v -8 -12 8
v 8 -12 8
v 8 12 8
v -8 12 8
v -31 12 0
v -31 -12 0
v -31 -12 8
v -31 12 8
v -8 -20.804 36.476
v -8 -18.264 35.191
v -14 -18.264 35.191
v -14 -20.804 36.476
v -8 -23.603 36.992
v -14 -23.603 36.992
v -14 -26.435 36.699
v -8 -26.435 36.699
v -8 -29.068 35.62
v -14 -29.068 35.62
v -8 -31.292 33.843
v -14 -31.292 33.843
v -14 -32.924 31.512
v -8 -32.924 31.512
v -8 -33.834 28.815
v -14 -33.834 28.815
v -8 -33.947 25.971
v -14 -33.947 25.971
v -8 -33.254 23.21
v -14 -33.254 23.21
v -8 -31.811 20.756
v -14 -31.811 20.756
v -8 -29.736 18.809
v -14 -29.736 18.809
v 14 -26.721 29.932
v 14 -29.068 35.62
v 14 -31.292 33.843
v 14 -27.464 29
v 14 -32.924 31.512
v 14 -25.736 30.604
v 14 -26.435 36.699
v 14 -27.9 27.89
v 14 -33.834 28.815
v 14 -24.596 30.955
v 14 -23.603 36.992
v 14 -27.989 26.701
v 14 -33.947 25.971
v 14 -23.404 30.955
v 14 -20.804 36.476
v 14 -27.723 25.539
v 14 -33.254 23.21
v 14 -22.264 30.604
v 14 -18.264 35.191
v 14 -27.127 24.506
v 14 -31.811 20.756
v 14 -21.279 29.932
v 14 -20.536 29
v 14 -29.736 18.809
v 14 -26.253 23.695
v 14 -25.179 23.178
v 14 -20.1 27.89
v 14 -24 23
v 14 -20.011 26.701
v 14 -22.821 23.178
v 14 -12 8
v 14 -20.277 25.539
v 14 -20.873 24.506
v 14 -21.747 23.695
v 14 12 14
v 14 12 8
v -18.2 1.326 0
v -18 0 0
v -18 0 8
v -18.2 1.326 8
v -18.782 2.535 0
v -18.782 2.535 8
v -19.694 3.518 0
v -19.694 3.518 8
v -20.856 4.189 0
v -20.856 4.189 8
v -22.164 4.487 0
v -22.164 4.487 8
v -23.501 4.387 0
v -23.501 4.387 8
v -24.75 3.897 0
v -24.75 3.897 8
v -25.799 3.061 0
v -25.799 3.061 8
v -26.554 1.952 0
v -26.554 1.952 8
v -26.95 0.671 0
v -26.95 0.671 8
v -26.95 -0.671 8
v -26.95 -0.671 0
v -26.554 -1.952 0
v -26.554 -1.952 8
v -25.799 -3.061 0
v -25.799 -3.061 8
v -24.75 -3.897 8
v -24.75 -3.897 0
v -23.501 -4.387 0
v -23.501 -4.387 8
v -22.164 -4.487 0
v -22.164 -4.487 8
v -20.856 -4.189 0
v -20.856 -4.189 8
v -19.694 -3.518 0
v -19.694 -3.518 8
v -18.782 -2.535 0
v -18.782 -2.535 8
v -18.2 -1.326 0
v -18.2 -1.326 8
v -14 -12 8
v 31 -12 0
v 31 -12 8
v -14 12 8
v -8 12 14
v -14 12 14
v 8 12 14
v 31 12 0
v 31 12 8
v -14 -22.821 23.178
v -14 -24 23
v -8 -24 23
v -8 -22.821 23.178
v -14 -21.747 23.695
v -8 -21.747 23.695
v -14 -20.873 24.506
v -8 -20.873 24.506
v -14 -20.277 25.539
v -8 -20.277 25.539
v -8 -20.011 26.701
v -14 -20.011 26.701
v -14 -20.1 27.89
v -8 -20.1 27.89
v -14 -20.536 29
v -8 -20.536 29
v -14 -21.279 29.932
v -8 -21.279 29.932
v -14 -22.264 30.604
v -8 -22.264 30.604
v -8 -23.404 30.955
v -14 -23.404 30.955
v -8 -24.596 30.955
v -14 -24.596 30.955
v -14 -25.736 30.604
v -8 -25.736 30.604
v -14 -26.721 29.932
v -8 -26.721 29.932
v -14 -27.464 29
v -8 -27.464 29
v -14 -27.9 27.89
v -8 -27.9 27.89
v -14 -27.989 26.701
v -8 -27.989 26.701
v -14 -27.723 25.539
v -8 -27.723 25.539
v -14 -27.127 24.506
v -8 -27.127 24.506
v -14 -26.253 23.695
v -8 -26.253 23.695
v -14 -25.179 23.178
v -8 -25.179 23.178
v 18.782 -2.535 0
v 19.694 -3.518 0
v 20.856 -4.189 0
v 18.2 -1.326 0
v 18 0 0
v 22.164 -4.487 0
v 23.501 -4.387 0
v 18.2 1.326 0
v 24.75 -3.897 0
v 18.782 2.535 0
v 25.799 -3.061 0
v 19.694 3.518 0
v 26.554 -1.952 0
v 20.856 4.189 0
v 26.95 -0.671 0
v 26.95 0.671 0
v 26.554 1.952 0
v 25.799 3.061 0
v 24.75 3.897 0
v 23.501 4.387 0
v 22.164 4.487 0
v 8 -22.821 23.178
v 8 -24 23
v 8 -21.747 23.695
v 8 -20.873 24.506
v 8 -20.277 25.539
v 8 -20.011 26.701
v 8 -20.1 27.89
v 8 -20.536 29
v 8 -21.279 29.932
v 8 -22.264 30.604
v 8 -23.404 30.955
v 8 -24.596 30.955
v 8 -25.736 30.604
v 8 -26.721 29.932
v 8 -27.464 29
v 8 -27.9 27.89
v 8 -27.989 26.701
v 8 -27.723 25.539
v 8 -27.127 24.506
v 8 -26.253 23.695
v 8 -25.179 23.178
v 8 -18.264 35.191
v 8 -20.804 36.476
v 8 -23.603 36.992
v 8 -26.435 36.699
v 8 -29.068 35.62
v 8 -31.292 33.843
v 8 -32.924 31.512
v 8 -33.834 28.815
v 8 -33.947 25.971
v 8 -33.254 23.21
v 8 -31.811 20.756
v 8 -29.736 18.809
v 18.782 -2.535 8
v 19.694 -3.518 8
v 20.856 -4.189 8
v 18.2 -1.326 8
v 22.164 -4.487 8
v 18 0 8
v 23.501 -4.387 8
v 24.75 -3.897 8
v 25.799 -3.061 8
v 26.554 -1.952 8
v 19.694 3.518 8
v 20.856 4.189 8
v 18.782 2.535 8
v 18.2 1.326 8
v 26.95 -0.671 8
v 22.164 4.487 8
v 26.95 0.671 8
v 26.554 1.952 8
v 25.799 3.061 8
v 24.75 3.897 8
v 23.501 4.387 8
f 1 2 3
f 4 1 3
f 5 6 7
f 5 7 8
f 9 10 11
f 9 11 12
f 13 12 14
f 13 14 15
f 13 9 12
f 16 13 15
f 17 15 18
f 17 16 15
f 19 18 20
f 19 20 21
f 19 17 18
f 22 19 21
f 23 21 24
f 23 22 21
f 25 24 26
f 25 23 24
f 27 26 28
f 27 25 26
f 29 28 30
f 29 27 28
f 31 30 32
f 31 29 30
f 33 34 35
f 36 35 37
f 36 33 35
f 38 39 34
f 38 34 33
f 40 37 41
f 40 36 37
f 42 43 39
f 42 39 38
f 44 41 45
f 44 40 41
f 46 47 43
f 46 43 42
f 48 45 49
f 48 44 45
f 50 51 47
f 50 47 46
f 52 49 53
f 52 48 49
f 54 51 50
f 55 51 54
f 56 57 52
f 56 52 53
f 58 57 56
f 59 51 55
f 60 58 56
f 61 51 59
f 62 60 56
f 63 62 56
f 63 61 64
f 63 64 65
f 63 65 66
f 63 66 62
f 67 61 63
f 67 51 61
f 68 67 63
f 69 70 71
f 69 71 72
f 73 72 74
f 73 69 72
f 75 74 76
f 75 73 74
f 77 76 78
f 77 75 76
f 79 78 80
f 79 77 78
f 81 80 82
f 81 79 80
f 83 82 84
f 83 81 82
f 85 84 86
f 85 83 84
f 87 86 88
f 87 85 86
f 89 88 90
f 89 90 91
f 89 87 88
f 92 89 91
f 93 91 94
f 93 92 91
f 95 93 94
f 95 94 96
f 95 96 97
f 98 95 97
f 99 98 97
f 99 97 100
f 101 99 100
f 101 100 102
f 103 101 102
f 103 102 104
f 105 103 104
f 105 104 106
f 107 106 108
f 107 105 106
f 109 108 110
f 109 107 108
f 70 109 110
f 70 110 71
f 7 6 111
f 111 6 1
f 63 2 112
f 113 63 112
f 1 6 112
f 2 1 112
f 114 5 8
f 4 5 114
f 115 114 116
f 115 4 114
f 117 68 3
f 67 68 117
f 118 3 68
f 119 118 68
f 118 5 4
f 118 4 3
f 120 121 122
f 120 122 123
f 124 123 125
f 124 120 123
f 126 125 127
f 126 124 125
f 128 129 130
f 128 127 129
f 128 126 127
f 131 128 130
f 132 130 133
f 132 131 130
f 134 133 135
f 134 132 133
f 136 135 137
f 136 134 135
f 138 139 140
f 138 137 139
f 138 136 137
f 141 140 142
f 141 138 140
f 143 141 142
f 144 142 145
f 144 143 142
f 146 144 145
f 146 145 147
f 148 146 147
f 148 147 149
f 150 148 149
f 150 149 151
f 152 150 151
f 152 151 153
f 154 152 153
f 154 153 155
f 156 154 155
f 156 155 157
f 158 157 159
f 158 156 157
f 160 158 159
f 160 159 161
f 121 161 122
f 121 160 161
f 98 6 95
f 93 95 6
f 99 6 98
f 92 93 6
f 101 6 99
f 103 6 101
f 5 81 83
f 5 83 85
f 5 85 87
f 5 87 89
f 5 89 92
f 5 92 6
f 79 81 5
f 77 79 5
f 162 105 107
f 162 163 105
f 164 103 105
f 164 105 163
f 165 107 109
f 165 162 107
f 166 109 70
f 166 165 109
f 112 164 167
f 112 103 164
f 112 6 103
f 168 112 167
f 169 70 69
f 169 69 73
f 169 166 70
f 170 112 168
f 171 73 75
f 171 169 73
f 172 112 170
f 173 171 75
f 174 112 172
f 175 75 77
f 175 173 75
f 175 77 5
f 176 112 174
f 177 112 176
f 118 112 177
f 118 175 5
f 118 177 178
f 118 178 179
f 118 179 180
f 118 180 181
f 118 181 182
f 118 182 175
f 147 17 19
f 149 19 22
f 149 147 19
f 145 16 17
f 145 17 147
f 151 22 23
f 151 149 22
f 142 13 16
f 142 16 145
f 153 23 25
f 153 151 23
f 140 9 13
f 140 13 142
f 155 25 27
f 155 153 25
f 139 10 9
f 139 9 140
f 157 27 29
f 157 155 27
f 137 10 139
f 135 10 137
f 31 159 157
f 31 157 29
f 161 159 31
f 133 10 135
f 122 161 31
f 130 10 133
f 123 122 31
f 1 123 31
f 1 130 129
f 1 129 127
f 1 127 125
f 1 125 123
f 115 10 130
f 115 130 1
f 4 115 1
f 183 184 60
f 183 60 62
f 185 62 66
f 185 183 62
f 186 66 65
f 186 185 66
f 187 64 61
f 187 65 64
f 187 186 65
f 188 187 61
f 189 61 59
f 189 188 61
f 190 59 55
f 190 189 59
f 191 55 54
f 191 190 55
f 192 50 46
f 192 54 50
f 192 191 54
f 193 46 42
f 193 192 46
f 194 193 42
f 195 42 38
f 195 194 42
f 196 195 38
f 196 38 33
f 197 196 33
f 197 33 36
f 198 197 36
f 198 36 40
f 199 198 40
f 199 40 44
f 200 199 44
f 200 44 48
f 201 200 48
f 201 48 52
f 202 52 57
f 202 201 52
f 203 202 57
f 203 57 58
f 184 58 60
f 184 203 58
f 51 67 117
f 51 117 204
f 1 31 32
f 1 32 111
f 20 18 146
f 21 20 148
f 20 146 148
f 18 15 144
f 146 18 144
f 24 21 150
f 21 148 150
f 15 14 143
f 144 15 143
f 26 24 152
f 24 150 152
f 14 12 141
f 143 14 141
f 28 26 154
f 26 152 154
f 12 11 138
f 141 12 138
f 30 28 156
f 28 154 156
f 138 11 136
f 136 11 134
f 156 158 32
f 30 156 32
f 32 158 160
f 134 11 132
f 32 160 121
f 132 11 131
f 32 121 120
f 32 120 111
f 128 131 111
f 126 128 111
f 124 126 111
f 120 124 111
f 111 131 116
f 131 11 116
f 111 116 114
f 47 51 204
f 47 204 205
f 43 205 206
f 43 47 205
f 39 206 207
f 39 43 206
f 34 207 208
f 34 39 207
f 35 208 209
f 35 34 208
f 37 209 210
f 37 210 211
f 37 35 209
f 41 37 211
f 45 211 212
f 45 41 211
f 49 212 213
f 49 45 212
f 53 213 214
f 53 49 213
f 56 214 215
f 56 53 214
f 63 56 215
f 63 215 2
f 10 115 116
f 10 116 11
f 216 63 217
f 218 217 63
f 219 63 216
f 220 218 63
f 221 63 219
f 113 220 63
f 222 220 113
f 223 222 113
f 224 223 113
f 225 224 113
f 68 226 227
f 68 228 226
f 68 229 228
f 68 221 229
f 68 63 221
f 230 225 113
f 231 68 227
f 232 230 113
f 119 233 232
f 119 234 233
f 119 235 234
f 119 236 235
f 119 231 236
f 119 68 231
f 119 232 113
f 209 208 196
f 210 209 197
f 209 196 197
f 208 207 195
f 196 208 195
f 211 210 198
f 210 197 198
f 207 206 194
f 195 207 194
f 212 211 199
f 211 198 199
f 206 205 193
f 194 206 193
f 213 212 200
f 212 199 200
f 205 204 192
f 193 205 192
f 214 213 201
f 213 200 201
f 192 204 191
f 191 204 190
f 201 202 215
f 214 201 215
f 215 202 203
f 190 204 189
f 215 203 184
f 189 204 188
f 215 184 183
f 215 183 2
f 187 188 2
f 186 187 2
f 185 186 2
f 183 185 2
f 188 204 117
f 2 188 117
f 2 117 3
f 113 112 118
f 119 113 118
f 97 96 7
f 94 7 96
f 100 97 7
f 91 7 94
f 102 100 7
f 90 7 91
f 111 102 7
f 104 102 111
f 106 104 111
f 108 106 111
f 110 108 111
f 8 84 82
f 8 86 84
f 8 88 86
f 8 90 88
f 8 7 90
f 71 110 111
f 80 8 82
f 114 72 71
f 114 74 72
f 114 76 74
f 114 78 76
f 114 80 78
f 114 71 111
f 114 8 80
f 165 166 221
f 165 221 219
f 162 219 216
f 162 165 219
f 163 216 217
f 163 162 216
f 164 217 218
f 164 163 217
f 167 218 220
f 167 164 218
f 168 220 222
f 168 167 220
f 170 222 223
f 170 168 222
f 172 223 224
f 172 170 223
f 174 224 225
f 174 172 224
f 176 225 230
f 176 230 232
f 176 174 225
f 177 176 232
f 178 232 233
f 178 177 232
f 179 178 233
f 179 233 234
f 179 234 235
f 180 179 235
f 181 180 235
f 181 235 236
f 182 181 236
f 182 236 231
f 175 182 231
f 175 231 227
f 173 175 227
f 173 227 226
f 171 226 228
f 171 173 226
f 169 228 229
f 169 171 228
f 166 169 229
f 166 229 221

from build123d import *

# Parameters (mm, degrees)
SKETCH_1_W               = 62
SKETCH_1_H               = 24
SKETCH_1_R               = 4.5
EXTRUDE_1_DEPTH          = 8
EXTRUDE_2_DEPTH          = 14
CUT_EXTRUDE_2_DEPTH      = 8
CUT_EXTRUDE_3_DEPTH      = 68.453687816
CUT_EXTRUDE_3_DEPTH_BACK = 68.453687816
SKETCH_6_R               = 4


with BuildPart() as part:
    # 草图1 → 凸台-拉伸1 (new body)
    with BuildSketch(Plane.XY):
        Rectangle(SKETCH_1_W, SKETCH_1_H)
        with Locations((-22.5, 0)):
            Circle(SKETCH_1_R, mode=Mode.SUBTRACT)
        with Locations(Location((22.5, 0, 0), (0, 0, 180))):
            Circle(SKETCH_1_R, mode=Mode.SUBTRACT)
    extrude(amount=EXTRUDE_1_DEPTH)

    # 草图2 → 凸台-拉伸2 (add, symmetric)
    with BuildSketch(Plane(origin=(0, 0, 0), x_dir=(0, 0, -1), z_dir=(1, 0, 0))):
        with BuildLine():
            Line((-8, 12), (-14, 12))
            Line((-14, 12), (-35.191485533, -18.26418578))
            ThreePointArc((-35.191485533, -18.26418578), (-32.73581422, -32.191485533), (-18.808514467, -29.73581422))
            Line((-18.808514467, -29.73581422), (-8, -12))
            Line((-8, -12), (0, -12))
            Line((0, -12), (0, 12))
            Line((0, 12), (-8, 12))
        make_face()
    extrude(amount=EXTRUDE_2_DEPTH, both=True)

    # 草图5 → 切除-拉伸2 (cut, symmetric)
    with BuildSketch(Plane(origin=(0, 0, 0), x_dir=(0, 0, -1), z_dir=(1, 0, 0))):
        with BuildLine():
            Line((-18.808514467, -29.73581422), (-8, -12))
            Line((-8, -12), (-8, 12))
            Line((-8, 12), (-14, 12))
            Line((-14, 12), (-35.191485533, -18.26418578))
            ThreePointArc((-35.191485533, -18.26418578), (-32.73581422, -32.191485533), (-18.808514467, -29.73581422))
        make_face()
    extrude(amount=CUT_EXTRUDE_2_DEPTH, both=True, mode=Mode.SUBTRACT)

    # 草图6 → 切除-拉伸3 (cut, two sides: drawn at the far end of the back side and taken through both)
    with BuildSketch(Plane(origin=(14, 0, 0), x_dir=(0, 0, -1), z_dir=(1, 0, 0)).offset(-CUT_EXTRUDE_3_DEPTH_BACK)):
        with Locations((-27, -24)):
            Circle(SKETCH_6_R)
    extrude(amount=CUT_EXTRUDE_3_DEPTH + CUT_EXTRUDE_3_DEPTH_BACK, mode=Mode.SUBTRACT)


solid = part.part
